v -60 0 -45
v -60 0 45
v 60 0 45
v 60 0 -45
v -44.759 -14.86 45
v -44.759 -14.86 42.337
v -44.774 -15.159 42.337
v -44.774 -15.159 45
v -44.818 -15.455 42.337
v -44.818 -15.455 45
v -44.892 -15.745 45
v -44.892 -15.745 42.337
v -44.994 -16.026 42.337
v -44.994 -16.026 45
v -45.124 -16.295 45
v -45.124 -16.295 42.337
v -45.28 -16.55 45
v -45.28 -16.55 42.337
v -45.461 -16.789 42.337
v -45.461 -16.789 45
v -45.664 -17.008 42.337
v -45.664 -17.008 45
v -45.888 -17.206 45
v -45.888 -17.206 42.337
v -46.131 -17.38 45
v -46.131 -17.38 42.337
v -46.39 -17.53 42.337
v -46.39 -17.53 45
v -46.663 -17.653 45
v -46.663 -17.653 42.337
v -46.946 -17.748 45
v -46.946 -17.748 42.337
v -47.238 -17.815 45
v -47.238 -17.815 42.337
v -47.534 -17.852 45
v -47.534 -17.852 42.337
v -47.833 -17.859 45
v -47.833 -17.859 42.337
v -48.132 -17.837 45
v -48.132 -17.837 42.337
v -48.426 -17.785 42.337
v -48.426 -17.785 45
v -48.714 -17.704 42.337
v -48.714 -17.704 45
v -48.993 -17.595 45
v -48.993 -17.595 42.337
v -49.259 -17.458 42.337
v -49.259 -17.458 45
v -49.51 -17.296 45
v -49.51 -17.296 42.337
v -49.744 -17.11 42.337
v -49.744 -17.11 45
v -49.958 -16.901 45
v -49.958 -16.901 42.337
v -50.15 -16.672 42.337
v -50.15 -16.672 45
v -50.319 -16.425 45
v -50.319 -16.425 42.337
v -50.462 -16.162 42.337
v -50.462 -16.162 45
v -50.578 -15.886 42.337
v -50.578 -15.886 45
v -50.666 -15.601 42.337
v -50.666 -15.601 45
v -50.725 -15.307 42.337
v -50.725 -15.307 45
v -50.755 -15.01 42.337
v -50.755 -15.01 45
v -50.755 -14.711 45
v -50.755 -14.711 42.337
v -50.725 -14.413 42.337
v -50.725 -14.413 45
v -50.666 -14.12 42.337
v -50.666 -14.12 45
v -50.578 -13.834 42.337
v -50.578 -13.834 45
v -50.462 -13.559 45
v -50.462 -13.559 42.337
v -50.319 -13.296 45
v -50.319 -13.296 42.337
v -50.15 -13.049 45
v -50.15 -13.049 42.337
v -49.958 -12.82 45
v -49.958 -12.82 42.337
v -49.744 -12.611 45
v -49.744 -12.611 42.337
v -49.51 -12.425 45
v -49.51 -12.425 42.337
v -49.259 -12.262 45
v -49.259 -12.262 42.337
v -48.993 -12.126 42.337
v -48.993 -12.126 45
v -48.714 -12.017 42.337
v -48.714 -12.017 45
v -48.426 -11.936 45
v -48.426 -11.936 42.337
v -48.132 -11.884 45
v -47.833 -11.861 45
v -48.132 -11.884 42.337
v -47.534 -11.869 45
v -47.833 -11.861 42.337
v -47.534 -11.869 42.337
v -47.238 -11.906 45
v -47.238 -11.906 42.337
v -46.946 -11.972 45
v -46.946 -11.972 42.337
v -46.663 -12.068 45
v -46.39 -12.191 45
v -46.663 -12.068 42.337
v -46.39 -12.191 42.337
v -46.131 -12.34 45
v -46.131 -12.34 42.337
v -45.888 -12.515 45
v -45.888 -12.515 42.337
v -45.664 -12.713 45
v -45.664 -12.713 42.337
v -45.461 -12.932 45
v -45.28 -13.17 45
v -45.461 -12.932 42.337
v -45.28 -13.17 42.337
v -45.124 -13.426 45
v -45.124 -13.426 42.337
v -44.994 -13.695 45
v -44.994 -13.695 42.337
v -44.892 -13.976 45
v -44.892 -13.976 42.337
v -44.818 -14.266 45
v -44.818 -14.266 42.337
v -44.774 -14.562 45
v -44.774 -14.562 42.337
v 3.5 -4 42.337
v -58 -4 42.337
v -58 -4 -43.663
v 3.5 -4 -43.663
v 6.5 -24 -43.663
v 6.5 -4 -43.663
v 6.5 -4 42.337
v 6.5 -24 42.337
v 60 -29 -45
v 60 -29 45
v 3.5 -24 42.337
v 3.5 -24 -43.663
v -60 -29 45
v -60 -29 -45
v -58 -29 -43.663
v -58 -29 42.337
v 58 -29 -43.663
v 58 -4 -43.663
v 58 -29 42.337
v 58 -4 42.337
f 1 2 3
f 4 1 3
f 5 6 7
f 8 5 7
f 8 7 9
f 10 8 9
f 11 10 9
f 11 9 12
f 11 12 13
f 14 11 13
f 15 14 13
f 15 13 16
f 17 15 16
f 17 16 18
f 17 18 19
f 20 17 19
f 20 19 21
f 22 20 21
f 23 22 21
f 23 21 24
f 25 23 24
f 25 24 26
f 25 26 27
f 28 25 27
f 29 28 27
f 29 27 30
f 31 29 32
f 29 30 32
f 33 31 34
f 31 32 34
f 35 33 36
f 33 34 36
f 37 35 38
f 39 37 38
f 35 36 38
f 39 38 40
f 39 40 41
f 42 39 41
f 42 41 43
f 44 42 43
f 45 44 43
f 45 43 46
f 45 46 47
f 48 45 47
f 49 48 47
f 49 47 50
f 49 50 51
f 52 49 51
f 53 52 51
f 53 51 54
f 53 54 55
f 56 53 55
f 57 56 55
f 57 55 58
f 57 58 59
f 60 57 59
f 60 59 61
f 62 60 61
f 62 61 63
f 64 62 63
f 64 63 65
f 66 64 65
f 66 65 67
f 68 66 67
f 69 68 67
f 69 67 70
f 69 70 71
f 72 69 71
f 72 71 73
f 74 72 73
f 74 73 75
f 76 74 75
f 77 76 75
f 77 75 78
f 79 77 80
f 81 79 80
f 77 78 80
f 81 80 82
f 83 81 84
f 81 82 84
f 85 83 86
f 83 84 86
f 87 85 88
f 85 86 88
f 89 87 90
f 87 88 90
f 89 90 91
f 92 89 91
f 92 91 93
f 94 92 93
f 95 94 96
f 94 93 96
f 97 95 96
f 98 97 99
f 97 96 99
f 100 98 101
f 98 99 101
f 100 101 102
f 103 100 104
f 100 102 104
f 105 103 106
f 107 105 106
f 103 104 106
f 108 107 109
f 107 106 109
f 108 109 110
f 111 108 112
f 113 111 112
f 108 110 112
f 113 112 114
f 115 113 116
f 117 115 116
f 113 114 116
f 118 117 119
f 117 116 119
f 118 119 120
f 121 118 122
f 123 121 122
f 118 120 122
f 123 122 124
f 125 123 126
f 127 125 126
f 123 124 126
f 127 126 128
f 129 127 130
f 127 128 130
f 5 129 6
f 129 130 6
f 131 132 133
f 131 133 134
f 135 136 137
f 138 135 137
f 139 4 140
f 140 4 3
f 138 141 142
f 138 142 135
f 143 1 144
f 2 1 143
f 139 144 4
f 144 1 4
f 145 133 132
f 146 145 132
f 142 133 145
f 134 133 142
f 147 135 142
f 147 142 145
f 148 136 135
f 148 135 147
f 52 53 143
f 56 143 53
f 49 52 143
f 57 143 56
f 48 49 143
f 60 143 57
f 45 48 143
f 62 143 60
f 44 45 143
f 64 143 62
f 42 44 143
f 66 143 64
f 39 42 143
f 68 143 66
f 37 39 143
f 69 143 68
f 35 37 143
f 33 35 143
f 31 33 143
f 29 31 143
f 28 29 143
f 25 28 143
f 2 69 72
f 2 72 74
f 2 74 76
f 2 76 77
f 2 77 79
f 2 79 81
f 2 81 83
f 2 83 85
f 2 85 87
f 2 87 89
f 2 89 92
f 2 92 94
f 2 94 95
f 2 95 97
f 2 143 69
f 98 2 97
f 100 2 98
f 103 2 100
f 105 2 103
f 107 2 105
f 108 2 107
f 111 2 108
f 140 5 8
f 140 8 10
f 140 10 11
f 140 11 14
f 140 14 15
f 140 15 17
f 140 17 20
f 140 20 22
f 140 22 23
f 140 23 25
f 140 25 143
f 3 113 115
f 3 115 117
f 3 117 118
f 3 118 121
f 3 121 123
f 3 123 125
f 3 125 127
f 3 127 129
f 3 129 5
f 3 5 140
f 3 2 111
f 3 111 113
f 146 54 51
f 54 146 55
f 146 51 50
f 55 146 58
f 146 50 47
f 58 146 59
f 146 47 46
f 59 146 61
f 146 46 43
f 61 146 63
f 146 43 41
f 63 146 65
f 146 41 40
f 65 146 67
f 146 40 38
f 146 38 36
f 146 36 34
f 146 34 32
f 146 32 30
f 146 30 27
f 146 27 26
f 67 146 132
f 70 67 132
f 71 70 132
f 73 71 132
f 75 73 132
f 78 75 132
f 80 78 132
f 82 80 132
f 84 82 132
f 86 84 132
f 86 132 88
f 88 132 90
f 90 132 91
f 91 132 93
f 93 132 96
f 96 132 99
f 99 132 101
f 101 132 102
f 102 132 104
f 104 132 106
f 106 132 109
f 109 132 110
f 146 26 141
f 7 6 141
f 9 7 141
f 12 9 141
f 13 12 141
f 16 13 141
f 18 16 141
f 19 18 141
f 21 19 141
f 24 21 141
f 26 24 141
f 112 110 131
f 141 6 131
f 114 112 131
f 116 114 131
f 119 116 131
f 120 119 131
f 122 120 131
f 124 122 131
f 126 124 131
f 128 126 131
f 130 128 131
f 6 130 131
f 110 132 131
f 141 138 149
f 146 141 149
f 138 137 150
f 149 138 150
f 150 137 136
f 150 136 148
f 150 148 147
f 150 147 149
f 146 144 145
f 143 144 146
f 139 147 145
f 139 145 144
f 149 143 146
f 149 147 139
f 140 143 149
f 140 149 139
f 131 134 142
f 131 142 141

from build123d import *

# Parameters (mm, degrees)
SKETCH_W      = 120
SKETCH_H      = 90
PAD_DEPTH     = 4
SKETCH001_W   = 120
SKETCH001_H   = 90
SKETCH001_W_2 = 116
SKETCH001_H_2 = 86
PAD001_DEPTH  = 25
SKETCH002_W   = 3
SKETCH002_H   = 90
PAD002_DEPTH  = 20
SKETCH004_R   = 3
HOLE_DEPTH    = 25


with BuildPart() as part:
    # Sketch → Pad (new body)
    with BuildSketch(Plane.XZ):
        Rectangle(SKETCH_W, SKETCH_H)
    extrude(amount=PAD_DEPTH)

    # Sketch001 (on Face6 of Pad) → Pad001 (join)
    with BuildSketch(Plane.XZ.offset(4)):
        Rectangle(SKETCH001_W, SKETCH001_H)
        with Locations((0, -0.662812)):
            Rectangle(SKETCH001_W_2, SKETCH001_H_2, mode=Mode.SUBTRACT)
    extrude(amount=PAD001_DEPTH)

    # Sketch002 (on Face15 of Pad001) → Pad002 (join)
    with BuildSketch(Plane.XZ.offset(4)):
        with Locations((5, 0)):
            Rectangle(SKETCH002_W, SKETCH002_H)
    extrude(amount=PAD002_DEPTH)

    # Sketch004 (on Face14 of Pad002) → Hole (cut)
    with BuildSketch(Plane(origin=(0, 0, 42.337188), x_dir=(1, 0, 0), z_dir=(0, 0, -1))):
        with Locations((-47.758679, 14.860328)):
            Circle(SKETCH004_R)
    extrude(amount=-HOLE_DEPTH, mode=Mode.SUBTRACT)


solid = part.part
